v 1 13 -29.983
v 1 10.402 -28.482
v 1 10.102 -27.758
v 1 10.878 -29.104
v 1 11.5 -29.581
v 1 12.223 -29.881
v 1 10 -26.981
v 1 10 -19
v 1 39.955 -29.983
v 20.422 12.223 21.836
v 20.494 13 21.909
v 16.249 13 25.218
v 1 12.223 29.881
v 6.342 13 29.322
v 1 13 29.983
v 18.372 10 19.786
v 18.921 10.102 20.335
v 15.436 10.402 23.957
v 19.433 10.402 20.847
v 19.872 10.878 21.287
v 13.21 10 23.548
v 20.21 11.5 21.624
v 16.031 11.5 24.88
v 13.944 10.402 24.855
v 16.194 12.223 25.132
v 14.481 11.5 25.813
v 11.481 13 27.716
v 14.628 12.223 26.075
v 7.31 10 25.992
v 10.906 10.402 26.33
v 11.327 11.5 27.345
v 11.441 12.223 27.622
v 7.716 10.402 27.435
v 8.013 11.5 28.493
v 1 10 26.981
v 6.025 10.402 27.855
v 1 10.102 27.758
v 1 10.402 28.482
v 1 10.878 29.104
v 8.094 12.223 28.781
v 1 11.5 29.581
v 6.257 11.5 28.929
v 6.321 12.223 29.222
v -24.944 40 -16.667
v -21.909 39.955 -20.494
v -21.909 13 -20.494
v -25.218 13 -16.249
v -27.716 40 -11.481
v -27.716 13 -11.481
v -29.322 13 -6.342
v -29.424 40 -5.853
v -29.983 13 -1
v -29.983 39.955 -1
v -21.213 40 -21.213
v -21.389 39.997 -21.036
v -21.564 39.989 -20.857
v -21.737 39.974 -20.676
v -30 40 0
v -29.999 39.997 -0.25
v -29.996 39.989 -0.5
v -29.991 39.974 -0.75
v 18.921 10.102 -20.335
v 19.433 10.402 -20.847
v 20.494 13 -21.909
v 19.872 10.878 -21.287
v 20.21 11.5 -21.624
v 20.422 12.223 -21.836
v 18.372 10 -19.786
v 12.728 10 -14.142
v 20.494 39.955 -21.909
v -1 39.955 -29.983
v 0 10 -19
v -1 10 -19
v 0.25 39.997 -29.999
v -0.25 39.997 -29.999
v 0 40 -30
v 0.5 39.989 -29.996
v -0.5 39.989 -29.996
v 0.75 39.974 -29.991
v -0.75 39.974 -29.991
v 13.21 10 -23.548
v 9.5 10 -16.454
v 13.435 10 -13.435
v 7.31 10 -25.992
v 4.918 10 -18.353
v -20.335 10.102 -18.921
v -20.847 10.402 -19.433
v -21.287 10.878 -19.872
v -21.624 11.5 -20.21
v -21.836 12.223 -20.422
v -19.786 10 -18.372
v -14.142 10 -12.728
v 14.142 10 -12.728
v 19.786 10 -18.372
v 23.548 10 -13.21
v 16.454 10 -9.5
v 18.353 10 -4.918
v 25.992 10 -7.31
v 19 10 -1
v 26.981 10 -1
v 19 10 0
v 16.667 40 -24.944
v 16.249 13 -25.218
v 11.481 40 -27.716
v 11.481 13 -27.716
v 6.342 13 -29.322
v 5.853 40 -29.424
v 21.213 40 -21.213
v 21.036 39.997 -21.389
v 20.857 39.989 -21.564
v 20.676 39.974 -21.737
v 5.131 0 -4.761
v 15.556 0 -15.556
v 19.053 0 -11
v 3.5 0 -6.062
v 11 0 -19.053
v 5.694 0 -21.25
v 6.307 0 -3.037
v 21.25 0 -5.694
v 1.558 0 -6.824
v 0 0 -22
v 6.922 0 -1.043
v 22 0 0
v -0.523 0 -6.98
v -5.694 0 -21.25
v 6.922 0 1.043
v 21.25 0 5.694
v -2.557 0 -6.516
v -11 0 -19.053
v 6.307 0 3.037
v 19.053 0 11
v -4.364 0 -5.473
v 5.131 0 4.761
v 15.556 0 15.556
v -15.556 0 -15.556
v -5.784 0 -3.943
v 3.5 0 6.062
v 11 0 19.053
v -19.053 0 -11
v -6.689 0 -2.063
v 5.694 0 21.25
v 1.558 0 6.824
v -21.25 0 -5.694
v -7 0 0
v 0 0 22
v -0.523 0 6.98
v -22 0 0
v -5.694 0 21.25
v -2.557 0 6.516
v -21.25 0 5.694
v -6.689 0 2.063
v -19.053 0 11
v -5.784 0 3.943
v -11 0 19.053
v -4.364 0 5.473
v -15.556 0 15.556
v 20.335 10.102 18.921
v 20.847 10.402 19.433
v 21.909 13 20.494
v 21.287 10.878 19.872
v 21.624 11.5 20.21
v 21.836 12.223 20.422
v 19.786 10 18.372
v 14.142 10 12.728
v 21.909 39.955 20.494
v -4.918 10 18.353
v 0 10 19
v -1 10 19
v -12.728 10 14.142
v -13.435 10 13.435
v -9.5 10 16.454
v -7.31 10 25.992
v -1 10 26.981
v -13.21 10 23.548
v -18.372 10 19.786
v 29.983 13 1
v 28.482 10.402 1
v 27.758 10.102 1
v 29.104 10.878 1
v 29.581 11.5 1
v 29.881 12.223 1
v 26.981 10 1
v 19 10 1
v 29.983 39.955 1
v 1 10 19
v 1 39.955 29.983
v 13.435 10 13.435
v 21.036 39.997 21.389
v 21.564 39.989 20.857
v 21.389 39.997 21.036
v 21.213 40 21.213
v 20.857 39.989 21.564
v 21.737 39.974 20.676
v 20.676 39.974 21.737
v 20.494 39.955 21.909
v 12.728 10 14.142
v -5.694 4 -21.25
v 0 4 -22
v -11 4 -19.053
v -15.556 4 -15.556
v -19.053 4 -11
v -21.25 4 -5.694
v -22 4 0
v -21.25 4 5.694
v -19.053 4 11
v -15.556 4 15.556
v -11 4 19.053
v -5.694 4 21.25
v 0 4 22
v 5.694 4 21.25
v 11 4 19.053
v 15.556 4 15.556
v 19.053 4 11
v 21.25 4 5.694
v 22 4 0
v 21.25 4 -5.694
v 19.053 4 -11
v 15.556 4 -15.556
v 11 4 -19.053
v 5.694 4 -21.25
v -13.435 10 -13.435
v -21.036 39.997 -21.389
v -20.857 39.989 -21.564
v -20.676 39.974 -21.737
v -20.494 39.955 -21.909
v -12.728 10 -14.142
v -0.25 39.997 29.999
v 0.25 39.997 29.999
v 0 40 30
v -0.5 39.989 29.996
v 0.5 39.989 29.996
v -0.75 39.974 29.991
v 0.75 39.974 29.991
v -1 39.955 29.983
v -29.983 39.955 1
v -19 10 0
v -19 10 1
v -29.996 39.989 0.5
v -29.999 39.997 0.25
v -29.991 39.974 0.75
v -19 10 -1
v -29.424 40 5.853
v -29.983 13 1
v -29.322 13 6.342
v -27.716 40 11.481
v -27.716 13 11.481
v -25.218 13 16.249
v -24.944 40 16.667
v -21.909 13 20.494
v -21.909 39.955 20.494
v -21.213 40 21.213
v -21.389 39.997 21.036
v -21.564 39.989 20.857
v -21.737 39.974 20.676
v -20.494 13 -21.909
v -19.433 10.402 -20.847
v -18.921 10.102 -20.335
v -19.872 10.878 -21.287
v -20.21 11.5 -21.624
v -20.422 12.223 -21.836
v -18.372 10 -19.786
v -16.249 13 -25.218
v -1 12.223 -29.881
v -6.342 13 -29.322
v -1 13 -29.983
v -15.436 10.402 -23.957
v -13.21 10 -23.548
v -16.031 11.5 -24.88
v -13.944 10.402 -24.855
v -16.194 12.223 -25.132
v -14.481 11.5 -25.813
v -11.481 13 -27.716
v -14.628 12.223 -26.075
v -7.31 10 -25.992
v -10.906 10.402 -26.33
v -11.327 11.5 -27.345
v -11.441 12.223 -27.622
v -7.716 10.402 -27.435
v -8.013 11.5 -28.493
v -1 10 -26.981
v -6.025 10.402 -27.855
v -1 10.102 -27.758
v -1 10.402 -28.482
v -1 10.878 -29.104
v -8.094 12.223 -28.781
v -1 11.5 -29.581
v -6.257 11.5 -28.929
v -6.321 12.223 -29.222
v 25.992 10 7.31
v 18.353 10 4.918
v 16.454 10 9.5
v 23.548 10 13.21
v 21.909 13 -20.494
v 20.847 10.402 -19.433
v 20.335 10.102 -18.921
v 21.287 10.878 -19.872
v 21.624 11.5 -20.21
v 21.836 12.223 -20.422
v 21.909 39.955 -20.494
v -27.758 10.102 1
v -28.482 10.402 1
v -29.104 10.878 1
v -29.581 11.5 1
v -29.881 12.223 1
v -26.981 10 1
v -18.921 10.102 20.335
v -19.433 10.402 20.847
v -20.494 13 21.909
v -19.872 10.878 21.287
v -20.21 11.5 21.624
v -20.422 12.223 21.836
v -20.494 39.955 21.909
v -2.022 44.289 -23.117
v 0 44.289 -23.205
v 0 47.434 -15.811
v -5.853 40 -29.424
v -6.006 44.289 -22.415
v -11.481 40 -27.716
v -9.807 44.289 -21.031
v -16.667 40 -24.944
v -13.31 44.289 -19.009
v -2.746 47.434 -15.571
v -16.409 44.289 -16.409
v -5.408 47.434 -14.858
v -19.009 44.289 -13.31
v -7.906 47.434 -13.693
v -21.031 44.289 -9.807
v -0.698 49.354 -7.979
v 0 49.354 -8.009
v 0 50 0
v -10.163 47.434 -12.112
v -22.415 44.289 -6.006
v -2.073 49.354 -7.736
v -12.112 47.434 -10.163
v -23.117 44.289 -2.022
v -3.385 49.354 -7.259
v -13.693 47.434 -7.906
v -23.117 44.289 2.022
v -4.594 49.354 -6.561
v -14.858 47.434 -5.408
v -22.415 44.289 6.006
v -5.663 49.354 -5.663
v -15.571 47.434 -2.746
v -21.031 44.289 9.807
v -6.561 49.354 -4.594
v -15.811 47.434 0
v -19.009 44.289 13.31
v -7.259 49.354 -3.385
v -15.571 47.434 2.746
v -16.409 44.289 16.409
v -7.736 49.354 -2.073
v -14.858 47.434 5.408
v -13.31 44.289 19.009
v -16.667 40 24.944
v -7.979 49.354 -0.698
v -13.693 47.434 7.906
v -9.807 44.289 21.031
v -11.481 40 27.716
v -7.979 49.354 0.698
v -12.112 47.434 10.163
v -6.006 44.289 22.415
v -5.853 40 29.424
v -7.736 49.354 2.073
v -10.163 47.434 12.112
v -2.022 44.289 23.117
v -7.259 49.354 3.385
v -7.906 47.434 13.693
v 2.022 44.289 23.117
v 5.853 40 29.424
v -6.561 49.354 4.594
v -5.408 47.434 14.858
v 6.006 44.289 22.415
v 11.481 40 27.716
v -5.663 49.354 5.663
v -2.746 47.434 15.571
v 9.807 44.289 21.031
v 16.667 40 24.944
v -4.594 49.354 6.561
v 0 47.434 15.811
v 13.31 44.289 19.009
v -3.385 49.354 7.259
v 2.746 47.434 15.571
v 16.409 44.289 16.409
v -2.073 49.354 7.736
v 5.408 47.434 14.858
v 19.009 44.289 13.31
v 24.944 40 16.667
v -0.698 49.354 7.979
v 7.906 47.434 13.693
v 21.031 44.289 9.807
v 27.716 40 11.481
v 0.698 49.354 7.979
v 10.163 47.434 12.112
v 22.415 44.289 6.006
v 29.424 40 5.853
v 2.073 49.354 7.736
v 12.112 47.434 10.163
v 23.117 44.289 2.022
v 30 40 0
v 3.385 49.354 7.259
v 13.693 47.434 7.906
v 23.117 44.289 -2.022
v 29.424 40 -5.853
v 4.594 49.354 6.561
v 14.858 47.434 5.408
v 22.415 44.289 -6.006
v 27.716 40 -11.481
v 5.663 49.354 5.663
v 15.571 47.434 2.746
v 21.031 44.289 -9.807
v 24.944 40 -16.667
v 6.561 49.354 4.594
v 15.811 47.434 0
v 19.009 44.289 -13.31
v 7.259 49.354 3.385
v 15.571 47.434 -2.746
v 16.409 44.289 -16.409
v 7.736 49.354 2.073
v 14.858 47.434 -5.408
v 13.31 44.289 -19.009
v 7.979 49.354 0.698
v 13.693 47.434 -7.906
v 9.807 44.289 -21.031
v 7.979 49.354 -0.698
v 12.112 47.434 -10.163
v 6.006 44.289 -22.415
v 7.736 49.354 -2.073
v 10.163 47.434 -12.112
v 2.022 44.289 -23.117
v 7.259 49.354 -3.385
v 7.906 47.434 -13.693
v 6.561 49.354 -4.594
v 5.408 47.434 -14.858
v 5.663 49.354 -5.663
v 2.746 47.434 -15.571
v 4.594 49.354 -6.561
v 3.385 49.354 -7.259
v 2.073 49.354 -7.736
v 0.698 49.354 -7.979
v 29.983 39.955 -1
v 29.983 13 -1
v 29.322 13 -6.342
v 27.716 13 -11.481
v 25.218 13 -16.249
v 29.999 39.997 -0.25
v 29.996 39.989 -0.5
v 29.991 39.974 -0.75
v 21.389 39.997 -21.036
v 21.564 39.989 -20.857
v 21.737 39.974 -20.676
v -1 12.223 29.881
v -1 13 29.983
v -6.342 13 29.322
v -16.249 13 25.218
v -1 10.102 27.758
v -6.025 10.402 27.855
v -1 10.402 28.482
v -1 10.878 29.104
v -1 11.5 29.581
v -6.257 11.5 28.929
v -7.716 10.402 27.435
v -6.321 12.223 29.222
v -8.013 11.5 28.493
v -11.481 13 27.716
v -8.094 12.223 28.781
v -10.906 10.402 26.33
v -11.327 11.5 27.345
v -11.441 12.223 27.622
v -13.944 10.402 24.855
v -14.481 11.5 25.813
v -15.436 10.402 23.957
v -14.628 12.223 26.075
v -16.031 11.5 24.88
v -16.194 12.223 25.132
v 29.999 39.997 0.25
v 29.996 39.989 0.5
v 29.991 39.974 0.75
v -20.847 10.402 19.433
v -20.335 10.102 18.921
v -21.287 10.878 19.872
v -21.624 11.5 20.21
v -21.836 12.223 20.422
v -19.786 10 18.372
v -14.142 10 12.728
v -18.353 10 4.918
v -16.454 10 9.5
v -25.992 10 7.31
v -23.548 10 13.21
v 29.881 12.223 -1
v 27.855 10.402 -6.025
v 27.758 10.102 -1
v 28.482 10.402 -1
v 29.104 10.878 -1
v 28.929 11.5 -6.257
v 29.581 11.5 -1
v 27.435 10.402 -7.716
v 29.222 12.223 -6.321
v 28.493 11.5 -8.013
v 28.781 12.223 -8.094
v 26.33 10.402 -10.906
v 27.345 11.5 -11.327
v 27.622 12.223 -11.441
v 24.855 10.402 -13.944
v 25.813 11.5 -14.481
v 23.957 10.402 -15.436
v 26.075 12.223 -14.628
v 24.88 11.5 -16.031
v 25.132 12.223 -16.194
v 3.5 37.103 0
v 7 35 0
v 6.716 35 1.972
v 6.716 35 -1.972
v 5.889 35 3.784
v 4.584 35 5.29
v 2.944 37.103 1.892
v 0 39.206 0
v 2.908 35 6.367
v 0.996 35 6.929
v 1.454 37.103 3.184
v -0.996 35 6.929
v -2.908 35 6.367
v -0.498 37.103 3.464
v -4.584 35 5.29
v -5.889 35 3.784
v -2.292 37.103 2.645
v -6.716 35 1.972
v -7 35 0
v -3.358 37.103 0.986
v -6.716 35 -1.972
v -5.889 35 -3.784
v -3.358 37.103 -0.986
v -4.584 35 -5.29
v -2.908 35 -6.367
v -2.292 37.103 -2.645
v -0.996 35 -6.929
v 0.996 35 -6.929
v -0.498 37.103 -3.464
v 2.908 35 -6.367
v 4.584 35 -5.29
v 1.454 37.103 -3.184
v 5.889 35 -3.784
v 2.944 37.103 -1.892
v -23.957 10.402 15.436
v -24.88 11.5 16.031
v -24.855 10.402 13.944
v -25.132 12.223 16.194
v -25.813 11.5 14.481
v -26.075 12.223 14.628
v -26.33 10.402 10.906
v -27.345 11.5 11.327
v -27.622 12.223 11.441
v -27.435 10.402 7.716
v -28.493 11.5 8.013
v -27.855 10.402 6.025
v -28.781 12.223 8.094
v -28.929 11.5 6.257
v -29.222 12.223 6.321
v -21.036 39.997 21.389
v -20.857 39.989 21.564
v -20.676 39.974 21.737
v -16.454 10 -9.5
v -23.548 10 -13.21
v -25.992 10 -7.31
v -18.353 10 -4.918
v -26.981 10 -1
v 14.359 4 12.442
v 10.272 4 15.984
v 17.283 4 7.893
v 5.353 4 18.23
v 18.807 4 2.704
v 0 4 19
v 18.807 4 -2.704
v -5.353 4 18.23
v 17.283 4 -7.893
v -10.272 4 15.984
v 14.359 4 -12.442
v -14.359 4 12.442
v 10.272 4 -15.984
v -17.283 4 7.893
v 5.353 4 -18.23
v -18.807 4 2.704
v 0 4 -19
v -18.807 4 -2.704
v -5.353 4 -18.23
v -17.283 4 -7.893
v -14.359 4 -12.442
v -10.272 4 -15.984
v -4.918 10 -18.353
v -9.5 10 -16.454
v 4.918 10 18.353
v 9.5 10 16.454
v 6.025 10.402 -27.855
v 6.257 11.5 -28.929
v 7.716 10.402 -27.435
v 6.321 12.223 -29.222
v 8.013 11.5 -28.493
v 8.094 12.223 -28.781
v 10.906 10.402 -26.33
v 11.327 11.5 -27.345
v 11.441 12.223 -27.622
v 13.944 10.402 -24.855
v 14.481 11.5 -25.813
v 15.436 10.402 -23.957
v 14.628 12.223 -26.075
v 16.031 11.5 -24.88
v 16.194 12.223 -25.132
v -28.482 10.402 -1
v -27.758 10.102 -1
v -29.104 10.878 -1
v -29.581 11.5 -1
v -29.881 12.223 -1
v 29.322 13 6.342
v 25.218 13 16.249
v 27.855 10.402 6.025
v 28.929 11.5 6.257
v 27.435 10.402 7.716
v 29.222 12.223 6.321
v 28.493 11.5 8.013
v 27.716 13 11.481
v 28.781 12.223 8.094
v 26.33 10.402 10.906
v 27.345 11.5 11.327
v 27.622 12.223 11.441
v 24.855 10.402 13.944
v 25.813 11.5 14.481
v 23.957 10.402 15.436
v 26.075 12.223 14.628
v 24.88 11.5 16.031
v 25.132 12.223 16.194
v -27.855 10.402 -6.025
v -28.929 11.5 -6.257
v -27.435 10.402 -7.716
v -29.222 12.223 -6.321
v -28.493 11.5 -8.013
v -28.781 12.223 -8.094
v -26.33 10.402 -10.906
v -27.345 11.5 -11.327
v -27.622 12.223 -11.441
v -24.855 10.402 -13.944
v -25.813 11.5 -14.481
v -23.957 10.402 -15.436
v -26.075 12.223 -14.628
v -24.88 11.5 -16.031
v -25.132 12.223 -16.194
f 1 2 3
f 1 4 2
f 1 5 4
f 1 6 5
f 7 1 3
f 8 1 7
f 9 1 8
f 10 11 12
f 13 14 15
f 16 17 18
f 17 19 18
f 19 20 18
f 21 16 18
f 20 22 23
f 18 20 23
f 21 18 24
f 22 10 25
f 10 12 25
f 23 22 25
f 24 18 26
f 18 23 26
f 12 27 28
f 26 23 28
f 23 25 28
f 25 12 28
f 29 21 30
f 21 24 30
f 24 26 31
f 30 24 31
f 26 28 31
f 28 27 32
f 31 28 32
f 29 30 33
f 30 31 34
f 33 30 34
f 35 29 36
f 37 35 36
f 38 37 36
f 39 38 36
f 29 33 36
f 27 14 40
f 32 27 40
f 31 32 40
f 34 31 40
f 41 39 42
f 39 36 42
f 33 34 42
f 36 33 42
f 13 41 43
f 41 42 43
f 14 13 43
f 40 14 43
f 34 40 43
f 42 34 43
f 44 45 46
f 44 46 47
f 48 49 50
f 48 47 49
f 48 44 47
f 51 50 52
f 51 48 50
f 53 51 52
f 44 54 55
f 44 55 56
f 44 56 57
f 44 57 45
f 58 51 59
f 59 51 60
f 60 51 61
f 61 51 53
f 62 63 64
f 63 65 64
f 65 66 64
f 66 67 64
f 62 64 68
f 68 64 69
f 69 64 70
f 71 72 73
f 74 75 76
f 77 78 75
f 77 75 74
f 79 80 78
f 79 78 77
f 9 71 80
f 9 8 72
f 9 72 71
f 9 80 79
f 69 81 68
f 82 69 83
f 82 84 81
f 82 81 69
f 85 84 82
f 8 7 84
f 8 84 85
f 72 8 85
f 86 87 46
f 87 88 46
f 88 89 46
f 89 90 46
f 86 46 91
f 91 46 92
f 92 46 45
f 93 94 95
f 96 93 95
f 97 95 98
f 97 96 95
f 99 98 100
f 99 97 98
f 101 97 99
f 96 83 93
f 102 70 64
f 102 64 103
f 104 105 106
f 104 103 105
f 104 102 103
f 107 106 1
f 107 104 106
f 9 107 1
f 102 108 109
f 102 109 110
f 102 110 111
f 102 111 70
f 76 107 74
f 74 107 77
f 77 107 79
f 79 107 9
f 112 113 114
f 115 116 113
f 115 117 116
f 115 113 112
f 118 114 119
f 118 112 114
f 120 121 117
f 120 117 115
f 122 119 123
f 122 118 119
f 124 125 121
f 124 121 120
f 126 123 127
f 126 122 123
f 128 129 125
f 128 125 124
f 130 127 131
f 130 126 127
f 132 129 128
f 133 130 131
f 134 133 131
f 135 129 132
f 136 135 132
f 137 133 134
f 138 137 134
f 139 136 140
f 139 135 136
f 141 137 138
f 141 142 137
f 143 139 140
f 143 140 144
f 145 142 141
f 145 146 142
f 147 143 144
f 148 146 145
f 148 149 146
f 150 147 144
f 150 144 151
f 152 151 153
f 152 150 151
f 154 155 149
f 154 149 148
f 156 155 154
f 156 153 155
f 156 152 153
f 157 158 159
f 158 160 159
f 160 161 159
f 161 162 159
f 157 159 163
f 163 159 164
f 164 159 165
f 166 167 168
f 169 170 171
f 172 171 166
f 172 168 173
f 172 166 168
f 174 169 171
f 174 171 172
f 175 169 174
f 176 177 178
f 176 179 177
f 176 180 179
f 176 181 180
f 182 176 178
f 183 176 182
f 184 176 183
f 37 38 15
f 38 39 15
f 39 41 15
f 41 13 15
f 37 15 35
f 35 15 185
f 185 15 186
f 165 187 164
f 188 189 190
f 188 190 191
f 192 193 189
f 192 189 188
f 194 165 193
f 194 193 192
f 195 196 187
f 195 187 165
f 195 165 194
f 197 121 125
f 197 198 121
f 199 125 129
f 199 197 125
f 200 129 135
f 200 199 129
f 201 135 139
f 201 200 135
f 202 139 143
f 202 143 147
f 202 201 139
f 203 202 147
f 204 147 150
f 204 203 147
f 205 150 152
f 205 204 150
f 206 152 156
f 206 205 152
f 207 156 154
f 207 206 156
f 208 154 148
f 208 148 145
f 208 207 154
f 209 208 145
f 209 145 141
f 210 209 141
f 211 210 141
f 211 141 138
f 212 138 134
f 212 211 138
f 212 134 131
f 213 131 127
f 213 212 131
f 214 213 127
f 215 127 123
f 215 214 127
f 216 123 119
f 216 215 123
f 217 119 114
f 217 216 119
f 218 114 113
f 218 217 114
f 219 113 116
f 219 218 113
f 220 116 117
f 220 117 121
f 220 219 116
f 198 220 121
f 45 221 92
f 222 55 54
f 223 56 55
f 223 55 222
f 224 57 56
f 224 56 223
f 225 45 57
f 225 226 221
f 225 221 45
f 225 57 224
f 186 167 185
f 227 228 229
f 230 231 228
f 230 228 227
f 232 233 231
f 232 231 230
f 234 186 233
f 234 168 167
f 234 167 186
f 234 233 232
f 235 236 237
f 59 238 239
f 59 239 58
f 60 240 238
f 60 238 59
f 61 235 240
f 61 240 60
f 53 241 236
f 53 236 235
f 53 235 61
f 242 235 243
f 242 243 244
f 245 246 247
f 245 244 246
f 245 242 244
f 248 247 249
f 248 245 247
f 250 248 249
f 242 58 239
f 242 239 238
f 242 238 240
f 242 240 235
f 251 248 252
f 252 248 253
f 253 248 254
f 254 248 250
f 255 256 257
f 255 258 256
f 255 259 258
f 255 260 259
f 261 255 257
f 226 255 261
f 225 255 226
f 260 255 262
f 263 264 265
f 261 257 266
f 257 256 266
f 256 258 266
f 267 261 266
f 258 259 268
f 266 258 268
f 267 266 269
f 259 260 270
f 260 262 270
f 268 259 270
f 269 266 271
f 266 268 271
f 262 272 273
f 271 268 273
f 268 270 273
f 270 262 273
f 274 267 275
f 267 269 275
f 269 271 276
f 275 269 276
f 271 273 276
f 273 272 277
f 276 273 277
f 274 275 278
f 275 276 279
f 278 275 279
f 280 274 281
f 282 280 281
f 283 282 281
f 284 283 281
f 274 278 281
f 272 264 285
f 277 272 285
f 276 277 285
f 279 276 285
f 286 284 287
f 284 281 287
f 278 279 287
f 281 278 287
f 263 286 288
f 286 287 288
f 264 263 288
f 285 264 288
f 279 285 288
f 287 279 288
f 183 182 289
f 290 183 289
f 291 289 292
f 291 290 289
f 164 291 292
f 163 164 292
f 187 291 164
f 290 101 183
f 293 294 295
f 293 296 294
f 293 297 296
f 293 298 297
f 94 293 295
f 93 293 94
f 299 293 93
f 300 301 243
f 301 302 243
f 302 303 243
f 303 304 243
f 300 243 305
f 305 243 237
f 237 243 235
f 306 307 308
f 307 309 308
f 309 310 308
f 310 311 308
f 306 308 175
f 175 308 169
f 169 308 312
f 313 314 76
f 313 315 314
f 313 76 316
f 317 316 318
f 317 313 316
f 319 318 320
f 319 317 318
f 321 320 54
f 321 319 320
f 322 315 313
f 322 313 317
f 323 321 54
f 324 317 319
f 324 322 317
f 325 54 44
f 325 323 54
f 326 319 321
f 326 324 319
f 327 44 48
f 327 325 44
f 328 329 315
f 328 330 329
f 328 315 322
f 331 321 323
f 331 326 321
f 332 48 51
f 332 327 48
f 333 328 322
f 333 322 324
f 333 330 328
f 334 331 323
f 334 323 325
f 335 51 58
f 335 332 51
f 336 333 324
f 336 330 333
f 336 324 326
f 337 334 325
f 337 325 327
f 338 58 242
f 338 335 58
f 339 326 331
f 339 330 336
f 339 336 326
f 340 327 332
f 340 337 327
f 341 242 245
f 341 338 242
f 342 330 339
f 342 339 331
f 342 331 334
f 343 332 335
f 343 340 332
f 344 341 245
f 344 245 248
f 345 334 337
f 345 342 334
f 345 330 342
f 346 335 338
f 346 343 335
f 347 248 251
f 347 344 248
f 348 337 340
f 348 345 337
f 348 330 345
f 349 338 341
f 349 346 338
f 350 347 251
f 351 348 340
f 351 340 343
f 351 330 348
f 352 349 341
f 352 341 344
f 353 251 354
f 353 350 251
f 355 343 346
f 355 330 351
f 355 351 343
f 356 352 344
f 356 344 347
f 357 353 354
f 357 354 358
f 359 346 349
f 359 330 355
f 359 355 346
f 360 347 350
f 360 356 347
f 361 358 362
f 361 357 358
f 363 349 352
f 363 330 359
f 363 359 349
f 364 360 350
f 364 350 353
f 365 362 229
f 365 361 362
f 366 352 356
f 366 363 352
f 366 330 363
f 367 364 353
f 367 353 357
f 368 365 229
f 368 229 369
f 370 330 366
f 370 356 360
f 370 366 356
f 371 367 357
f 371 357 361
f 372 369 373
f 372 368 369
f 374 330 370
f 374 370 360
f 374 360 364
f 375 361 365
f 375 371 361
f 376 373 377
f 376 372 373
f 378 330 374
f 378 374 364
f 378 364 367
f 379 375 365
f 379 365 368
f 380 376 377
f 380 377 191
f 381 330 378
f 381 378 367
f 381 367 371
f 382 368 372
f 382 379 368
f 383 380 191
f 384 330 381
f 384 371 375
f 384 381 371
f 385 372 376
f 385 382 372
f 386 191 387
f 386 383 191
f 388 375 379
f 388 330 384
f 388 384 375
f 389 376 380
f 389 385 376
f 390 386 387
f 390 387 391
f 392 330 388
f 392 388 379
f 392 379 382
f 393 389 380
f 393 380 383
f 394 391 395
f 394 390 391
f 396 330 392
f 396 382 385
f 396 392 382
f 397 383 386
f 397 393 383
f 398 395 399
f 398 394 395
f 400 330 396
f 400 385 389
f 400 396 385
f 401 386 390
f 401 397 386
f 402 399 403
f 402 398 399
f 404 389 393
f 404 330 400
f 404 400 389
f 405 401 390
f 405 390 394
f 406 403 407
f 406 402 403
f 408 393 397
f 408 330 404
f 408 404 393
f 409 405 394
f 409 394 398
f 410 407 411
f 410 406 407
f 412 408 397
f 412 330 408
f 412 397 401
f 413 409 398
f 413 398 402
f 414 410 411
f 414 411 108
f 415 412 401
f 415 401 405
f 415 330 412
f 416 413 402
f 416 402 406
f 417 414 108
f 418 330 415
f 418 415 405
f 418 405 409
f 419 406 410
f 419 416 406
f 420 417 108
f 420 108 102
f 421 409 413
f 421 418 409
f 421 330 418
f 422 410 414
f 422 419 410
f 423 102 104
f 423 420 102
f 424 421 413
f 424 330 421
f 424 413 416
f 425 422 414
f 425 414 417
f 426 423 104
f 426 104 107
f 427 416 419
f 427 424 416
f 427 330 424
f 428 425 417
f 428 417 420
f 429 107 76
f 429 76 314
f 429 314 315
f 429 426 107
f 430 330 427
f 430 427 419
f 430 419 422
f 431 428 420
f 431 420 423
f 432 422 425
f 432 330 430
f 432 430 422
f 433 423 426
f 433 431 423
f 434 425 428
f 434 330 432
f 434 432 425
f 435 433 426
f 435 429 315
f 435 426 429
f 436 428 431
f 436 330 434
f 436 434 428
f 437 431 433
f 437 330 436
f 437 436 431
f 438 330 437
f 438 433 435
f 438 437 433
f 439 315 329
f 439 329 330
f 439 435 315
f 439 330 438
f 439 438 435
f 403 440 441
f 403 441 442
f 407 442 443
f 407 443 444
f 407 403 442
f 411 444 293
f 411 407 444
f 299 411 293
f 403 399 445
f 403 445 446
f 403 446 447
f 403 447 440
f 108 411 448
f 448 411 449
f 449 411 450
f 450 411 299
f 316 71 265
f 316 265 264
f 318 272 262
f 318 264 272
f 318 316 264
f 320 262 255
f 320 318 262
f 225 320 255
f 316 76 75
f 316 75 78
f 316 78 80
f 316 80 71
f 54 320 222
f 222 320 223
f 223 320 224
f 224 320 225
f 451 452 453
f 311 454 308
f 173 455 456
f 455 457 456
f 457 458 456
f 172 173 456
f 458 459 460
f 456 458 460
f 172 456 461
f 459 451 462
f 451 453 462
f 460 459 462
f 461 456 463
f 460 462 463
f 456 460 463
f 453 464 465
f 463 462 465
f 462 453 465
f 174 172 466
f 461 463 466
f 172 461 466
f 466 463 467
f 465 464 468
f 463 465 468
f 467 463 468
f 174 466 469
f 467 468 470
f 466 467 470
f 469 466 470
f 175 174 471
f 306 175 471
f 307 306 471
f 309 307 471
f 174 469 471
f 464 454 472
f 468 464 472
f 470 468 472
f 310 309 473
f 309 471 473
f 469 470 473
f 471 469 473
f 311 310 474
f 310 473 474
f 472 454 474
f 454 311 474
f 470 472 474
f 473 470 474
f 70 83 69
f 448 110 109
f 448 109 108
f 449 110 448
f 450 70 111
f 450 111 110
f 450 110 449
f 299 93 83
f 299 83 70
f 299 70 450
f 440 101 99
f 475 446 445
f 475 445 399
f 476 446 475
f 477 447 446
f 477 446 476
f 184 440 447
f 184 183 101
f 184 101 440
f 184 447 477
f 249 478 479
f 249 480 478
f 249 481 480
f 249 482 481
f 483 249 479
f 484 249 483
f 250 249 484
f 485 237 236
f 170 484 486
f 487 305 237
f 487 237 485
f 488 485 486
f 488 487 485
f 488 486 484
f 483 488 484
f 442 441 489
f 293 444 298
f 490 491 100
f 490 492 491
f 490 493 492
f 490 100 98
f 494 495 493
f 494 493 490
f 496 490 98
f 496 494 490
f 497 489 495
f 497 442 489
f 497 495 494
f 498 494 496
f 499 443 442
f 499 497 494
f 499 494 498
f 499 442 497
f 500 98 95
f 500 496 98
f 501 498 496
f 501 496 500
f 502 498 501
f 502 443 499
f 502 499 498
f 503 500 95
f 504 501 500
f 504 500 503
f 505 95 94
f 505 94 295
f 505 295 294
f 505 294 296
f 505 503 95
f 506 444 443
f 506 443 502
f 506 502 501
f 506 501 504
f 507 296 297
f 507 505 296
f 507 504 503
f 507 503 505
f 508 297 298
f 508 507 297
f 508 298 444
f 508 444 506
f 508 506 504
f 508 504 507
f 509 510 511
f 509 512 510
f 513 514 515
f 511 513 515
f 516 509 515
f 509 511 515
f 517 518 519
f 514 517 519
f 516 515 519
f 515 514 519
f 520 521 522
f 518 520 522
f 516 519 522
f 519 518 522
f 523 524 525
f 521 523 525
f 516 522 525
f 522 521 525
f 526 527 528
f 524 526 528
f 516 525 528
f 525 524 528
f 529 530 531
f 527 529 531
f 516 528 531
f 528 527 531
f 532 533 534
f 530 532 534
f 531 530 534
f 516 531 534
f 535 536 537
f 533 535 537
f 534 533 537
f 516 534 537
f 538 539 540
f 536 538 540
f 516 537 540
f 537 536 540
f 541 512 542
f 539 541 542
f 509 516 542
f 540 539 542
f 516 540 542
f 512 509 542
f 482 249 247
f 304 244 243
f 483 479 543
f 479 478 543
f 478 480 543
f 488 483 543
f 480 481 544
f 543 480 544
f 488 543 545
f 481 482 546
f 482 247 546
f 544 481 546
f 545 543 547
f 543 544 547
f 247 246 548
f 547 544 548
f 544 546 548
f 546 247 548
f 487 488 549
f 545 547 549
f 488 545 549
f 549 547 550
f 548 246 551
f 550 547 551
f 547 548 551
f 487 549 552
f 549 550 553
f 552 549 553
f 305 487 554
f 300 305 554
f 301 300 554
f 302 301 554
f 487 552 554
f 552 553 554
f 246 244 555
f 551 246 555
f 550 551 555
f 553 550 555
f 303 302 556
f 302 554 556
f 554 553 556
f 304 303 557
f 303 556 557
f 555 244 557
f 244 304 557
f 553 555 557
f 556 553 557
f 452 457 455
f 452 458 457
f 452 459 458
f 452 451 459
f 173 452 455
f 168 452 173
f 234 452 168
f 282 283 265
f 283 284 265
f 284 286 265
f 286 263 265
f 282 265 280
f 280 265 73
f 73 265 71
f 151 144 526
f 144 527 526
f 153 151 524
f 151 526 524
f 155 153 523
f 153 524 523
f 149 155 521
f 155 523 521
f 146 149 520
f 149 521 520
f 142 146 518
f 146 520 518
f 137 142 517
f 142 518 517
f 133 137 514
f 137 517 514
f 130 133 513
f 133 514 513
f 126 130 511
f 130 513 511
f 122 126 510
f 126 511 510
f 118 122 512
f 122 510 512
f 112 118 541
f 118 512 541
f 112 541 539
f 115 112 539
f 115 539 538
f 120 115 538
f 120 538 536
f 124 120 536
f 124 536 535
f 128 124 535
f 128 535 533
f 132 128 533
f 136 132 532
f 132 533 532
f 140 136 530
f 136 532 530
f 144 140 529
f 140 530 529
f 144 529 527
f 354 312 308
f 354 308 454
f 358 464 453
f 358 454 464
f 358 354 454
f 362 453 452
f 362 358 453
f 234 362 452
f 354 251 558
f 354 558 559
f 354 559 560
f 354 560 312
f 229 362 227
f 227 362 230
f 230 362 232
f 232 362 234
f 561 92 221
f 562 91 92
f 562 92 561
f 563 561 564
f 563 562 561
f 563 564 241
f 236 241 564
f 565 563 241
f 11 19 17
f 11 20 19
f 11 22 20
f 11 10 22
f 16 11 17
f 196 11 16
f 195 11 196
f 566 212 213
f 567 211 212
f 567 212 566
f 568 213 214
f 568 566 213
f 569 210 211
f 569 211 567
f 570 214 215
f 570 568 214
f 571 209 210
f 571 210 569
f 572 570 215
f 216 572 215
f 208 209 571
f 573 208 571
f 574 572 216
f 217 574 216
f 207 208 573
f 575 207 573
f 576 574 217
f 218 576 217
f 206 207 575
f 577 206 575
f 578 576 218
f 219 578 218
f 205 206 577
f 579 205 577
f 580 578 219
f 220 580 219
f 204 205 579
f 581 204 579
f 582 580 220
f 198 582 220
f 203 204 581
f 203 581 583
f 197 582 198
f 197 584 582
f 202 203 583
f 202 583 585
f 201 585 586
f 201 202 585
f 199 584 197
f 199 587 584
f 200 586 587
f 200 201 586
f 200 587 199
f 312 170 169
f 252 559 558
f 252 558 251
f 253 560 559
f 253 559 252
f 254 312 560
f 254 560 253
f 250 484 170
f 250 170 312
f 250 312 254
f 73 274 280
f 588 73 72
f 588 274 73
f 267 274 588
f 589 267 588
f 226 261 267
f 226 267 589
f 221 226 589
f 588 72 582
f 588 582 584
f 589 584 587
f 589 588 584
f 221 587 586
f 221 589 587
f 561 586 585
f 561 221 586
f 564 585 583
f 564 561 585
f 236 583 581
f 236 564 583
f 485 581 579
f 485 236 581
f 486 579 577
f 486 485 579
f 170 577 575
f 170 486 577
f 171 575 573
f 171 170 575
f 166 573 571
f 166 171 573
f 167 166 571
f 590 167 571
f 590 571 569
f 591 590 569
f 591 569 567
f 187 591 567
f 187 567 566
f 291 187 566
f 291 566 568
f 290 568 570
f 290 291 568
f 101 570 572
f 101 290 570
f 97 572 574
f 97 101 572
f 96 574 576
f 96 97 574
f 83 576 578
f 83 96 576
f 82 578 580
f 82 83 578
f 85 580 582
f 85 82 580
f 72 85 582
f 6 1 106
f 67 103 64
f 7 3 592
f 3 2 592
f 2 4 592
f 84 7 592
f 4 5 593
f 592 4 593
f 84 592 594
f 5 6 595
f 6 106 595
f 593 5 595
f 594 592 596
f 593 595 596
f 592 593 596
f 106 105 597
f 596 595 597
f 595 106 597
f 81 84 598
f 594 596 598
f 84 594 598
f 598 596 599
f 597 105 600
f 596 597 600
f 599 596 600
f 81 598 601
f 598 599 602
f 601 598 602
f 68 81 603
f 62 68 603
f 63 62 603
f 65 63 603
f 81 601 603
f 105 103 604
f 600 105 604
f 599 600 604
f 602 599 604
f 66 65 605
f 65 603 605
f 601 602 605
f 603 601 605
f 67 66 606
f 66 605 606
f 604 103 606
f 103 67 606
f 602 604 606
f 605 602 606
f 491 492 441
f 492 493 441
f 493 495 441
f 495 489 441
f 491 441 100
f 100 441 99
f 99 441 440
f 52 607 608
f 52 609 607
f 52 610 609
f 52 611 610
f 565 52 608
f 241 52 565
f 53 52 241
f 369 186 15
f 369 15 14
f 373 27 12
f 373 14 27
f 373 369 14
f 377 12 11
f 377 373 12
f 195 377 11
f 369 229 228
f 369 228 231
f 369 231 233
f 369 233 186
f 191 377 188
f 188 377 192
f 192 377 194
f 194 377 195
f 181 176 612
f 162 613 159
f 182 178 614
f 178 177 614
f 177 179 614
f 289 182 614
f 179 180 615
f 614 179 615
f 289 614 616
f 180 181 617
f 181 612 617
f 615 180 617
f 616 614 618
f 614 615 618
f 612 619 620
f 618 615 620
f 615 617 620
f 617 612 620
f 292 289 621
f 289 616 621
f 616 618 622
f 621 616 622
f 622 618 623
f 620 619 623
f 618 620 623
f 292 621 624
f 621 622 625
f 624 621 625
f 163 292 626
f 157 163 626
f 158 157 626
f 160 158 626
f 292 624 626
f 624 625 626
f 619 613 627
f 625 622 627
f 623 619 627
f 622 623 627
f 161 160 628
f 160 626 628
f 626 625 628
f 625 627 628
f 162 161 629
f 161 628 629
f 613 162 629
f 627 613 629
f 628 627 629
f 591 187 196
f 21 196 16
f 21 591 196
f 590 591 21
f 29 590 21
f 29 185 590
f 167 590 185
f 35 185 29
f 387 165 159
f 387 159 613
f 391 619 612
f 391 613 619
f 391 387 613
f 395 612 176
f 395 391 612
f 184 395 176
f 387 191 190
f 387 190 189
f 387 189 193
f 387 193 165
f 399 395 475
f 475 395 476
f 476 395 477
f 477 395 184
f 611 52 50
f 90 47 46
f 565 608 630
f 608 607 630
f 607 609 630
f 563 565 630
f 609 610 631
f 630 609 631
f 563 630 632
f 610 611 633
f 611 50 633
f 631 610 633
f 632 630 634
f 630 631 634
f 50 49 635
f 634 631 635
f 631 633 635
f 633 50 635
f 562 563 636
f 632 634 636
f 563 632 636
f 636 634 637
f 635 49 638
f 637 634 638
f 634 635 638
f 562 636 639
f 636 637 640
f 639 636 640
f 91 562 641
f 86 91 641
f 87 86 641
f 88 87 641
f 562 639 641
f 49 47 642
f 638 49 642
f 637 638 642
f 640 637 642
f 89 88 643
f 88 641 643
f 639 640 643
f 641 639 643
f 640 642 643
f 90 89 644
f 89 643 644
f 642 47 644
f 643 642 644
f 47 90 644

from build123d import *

# Parameters (mm, degrees)
M16_TAPPED_HOLE1_D     = 14
M16_TAPPED_HOLE1_DEPTH = 35
M16_TAPPED_HOLE1_TIP   = 4.206024333
CUT_EXTRUDE1_DEPTH     = 1
CIRPATTERN1_COUNT      = 8
FILLET1_R              = 3


with BuildPart() as part:
    # Sketch3 → Revolve1 (revolve)
    with BuildSketch(Plane.XY, mode=Mode.PRIVATE) as revolve1_sk:
        with BuildLine():
            Line((0, 0), (22, 0))
            Line((22, 0), (22, 4))
            Line((22, 4), (19, 4))
            Line((19, 4), (19, 10))
            Line((19, 10), (30, 10))
            Line((30, 10), (30, 40))
            ThreePointArc((30, 40), (15.811388301, 47.434164903), (0, 50))
            Line((0, 50), (0, 0))
        make_face()
    revolve(revolve1_sk.sketch.rotate(Axis((0, 0, 0), (0, 1, 0)), 90), axis=Axis((0, 0, 0), (0, 1, 0)))

    # M16 Tapped Hole1
    with Locations(Plane.XZ):
        with Locations((0, 0)):
            Hole(M16_TAPPED_HOLE1_D / 2, depth=M16_TAPPED_HOLE1_DEPTH)
            with Locations((0, 0, -(M16_TAPPED_HOLE1_DEPTH + M16_TAPPED_HOLE1_TIP / 2))):  # 118° drill point
                Cone(0, M16_TAPPED_HOLE1_D / 2, M16_TAPPED_HOLE1_TIP, mode=Mode.SUBTRACT)

    # Sketch7 → Cut-Extrude1 (cut, symmetric)
    with BuildSketch(Plane.XY):
        Polygon((30, 40), (30, 10), (19, 10), align=None)
    cut_extrude1 = extrude(amount=CUT_EXTRUDE1_DEPTH, both=True, mode=Mode.SUBTRACT)

    # CirPattern1: Cut-Extrude1 ×8 about axis
    cirpattern1_axis = Axis((0, 0, 0), (0, 1, 0))
    for i in range(1, CIRPATTERN1_COUNT):
        add(cut_extrude1.rotate(cirpattern1_axis, i * 360 / CIRPATTERN1_COUNT), mode=Mode.SUBTRACT)

    # Fillet1
    fillet1_edges = [part.edges().sort_by_distance(p)[0] for p in [
        (27.716385975, 10, 11.480502971),
        (11.480502971, 10, 27.716385975),
        (-11.480502971, 10, 27.716385975),
        (-27.716385975, 10, 11.480502971),
        (-27.716385975, 10, -11.480502971),
        (-11.480502971, 10, -27.716385975),
        (11.480502971, 10, -27.716385975),
        (27.716385975, 10, -11.480502971),
    ]]
    fillet(fillet1_edges, radius=FILLET1_R)


solid = part.part
